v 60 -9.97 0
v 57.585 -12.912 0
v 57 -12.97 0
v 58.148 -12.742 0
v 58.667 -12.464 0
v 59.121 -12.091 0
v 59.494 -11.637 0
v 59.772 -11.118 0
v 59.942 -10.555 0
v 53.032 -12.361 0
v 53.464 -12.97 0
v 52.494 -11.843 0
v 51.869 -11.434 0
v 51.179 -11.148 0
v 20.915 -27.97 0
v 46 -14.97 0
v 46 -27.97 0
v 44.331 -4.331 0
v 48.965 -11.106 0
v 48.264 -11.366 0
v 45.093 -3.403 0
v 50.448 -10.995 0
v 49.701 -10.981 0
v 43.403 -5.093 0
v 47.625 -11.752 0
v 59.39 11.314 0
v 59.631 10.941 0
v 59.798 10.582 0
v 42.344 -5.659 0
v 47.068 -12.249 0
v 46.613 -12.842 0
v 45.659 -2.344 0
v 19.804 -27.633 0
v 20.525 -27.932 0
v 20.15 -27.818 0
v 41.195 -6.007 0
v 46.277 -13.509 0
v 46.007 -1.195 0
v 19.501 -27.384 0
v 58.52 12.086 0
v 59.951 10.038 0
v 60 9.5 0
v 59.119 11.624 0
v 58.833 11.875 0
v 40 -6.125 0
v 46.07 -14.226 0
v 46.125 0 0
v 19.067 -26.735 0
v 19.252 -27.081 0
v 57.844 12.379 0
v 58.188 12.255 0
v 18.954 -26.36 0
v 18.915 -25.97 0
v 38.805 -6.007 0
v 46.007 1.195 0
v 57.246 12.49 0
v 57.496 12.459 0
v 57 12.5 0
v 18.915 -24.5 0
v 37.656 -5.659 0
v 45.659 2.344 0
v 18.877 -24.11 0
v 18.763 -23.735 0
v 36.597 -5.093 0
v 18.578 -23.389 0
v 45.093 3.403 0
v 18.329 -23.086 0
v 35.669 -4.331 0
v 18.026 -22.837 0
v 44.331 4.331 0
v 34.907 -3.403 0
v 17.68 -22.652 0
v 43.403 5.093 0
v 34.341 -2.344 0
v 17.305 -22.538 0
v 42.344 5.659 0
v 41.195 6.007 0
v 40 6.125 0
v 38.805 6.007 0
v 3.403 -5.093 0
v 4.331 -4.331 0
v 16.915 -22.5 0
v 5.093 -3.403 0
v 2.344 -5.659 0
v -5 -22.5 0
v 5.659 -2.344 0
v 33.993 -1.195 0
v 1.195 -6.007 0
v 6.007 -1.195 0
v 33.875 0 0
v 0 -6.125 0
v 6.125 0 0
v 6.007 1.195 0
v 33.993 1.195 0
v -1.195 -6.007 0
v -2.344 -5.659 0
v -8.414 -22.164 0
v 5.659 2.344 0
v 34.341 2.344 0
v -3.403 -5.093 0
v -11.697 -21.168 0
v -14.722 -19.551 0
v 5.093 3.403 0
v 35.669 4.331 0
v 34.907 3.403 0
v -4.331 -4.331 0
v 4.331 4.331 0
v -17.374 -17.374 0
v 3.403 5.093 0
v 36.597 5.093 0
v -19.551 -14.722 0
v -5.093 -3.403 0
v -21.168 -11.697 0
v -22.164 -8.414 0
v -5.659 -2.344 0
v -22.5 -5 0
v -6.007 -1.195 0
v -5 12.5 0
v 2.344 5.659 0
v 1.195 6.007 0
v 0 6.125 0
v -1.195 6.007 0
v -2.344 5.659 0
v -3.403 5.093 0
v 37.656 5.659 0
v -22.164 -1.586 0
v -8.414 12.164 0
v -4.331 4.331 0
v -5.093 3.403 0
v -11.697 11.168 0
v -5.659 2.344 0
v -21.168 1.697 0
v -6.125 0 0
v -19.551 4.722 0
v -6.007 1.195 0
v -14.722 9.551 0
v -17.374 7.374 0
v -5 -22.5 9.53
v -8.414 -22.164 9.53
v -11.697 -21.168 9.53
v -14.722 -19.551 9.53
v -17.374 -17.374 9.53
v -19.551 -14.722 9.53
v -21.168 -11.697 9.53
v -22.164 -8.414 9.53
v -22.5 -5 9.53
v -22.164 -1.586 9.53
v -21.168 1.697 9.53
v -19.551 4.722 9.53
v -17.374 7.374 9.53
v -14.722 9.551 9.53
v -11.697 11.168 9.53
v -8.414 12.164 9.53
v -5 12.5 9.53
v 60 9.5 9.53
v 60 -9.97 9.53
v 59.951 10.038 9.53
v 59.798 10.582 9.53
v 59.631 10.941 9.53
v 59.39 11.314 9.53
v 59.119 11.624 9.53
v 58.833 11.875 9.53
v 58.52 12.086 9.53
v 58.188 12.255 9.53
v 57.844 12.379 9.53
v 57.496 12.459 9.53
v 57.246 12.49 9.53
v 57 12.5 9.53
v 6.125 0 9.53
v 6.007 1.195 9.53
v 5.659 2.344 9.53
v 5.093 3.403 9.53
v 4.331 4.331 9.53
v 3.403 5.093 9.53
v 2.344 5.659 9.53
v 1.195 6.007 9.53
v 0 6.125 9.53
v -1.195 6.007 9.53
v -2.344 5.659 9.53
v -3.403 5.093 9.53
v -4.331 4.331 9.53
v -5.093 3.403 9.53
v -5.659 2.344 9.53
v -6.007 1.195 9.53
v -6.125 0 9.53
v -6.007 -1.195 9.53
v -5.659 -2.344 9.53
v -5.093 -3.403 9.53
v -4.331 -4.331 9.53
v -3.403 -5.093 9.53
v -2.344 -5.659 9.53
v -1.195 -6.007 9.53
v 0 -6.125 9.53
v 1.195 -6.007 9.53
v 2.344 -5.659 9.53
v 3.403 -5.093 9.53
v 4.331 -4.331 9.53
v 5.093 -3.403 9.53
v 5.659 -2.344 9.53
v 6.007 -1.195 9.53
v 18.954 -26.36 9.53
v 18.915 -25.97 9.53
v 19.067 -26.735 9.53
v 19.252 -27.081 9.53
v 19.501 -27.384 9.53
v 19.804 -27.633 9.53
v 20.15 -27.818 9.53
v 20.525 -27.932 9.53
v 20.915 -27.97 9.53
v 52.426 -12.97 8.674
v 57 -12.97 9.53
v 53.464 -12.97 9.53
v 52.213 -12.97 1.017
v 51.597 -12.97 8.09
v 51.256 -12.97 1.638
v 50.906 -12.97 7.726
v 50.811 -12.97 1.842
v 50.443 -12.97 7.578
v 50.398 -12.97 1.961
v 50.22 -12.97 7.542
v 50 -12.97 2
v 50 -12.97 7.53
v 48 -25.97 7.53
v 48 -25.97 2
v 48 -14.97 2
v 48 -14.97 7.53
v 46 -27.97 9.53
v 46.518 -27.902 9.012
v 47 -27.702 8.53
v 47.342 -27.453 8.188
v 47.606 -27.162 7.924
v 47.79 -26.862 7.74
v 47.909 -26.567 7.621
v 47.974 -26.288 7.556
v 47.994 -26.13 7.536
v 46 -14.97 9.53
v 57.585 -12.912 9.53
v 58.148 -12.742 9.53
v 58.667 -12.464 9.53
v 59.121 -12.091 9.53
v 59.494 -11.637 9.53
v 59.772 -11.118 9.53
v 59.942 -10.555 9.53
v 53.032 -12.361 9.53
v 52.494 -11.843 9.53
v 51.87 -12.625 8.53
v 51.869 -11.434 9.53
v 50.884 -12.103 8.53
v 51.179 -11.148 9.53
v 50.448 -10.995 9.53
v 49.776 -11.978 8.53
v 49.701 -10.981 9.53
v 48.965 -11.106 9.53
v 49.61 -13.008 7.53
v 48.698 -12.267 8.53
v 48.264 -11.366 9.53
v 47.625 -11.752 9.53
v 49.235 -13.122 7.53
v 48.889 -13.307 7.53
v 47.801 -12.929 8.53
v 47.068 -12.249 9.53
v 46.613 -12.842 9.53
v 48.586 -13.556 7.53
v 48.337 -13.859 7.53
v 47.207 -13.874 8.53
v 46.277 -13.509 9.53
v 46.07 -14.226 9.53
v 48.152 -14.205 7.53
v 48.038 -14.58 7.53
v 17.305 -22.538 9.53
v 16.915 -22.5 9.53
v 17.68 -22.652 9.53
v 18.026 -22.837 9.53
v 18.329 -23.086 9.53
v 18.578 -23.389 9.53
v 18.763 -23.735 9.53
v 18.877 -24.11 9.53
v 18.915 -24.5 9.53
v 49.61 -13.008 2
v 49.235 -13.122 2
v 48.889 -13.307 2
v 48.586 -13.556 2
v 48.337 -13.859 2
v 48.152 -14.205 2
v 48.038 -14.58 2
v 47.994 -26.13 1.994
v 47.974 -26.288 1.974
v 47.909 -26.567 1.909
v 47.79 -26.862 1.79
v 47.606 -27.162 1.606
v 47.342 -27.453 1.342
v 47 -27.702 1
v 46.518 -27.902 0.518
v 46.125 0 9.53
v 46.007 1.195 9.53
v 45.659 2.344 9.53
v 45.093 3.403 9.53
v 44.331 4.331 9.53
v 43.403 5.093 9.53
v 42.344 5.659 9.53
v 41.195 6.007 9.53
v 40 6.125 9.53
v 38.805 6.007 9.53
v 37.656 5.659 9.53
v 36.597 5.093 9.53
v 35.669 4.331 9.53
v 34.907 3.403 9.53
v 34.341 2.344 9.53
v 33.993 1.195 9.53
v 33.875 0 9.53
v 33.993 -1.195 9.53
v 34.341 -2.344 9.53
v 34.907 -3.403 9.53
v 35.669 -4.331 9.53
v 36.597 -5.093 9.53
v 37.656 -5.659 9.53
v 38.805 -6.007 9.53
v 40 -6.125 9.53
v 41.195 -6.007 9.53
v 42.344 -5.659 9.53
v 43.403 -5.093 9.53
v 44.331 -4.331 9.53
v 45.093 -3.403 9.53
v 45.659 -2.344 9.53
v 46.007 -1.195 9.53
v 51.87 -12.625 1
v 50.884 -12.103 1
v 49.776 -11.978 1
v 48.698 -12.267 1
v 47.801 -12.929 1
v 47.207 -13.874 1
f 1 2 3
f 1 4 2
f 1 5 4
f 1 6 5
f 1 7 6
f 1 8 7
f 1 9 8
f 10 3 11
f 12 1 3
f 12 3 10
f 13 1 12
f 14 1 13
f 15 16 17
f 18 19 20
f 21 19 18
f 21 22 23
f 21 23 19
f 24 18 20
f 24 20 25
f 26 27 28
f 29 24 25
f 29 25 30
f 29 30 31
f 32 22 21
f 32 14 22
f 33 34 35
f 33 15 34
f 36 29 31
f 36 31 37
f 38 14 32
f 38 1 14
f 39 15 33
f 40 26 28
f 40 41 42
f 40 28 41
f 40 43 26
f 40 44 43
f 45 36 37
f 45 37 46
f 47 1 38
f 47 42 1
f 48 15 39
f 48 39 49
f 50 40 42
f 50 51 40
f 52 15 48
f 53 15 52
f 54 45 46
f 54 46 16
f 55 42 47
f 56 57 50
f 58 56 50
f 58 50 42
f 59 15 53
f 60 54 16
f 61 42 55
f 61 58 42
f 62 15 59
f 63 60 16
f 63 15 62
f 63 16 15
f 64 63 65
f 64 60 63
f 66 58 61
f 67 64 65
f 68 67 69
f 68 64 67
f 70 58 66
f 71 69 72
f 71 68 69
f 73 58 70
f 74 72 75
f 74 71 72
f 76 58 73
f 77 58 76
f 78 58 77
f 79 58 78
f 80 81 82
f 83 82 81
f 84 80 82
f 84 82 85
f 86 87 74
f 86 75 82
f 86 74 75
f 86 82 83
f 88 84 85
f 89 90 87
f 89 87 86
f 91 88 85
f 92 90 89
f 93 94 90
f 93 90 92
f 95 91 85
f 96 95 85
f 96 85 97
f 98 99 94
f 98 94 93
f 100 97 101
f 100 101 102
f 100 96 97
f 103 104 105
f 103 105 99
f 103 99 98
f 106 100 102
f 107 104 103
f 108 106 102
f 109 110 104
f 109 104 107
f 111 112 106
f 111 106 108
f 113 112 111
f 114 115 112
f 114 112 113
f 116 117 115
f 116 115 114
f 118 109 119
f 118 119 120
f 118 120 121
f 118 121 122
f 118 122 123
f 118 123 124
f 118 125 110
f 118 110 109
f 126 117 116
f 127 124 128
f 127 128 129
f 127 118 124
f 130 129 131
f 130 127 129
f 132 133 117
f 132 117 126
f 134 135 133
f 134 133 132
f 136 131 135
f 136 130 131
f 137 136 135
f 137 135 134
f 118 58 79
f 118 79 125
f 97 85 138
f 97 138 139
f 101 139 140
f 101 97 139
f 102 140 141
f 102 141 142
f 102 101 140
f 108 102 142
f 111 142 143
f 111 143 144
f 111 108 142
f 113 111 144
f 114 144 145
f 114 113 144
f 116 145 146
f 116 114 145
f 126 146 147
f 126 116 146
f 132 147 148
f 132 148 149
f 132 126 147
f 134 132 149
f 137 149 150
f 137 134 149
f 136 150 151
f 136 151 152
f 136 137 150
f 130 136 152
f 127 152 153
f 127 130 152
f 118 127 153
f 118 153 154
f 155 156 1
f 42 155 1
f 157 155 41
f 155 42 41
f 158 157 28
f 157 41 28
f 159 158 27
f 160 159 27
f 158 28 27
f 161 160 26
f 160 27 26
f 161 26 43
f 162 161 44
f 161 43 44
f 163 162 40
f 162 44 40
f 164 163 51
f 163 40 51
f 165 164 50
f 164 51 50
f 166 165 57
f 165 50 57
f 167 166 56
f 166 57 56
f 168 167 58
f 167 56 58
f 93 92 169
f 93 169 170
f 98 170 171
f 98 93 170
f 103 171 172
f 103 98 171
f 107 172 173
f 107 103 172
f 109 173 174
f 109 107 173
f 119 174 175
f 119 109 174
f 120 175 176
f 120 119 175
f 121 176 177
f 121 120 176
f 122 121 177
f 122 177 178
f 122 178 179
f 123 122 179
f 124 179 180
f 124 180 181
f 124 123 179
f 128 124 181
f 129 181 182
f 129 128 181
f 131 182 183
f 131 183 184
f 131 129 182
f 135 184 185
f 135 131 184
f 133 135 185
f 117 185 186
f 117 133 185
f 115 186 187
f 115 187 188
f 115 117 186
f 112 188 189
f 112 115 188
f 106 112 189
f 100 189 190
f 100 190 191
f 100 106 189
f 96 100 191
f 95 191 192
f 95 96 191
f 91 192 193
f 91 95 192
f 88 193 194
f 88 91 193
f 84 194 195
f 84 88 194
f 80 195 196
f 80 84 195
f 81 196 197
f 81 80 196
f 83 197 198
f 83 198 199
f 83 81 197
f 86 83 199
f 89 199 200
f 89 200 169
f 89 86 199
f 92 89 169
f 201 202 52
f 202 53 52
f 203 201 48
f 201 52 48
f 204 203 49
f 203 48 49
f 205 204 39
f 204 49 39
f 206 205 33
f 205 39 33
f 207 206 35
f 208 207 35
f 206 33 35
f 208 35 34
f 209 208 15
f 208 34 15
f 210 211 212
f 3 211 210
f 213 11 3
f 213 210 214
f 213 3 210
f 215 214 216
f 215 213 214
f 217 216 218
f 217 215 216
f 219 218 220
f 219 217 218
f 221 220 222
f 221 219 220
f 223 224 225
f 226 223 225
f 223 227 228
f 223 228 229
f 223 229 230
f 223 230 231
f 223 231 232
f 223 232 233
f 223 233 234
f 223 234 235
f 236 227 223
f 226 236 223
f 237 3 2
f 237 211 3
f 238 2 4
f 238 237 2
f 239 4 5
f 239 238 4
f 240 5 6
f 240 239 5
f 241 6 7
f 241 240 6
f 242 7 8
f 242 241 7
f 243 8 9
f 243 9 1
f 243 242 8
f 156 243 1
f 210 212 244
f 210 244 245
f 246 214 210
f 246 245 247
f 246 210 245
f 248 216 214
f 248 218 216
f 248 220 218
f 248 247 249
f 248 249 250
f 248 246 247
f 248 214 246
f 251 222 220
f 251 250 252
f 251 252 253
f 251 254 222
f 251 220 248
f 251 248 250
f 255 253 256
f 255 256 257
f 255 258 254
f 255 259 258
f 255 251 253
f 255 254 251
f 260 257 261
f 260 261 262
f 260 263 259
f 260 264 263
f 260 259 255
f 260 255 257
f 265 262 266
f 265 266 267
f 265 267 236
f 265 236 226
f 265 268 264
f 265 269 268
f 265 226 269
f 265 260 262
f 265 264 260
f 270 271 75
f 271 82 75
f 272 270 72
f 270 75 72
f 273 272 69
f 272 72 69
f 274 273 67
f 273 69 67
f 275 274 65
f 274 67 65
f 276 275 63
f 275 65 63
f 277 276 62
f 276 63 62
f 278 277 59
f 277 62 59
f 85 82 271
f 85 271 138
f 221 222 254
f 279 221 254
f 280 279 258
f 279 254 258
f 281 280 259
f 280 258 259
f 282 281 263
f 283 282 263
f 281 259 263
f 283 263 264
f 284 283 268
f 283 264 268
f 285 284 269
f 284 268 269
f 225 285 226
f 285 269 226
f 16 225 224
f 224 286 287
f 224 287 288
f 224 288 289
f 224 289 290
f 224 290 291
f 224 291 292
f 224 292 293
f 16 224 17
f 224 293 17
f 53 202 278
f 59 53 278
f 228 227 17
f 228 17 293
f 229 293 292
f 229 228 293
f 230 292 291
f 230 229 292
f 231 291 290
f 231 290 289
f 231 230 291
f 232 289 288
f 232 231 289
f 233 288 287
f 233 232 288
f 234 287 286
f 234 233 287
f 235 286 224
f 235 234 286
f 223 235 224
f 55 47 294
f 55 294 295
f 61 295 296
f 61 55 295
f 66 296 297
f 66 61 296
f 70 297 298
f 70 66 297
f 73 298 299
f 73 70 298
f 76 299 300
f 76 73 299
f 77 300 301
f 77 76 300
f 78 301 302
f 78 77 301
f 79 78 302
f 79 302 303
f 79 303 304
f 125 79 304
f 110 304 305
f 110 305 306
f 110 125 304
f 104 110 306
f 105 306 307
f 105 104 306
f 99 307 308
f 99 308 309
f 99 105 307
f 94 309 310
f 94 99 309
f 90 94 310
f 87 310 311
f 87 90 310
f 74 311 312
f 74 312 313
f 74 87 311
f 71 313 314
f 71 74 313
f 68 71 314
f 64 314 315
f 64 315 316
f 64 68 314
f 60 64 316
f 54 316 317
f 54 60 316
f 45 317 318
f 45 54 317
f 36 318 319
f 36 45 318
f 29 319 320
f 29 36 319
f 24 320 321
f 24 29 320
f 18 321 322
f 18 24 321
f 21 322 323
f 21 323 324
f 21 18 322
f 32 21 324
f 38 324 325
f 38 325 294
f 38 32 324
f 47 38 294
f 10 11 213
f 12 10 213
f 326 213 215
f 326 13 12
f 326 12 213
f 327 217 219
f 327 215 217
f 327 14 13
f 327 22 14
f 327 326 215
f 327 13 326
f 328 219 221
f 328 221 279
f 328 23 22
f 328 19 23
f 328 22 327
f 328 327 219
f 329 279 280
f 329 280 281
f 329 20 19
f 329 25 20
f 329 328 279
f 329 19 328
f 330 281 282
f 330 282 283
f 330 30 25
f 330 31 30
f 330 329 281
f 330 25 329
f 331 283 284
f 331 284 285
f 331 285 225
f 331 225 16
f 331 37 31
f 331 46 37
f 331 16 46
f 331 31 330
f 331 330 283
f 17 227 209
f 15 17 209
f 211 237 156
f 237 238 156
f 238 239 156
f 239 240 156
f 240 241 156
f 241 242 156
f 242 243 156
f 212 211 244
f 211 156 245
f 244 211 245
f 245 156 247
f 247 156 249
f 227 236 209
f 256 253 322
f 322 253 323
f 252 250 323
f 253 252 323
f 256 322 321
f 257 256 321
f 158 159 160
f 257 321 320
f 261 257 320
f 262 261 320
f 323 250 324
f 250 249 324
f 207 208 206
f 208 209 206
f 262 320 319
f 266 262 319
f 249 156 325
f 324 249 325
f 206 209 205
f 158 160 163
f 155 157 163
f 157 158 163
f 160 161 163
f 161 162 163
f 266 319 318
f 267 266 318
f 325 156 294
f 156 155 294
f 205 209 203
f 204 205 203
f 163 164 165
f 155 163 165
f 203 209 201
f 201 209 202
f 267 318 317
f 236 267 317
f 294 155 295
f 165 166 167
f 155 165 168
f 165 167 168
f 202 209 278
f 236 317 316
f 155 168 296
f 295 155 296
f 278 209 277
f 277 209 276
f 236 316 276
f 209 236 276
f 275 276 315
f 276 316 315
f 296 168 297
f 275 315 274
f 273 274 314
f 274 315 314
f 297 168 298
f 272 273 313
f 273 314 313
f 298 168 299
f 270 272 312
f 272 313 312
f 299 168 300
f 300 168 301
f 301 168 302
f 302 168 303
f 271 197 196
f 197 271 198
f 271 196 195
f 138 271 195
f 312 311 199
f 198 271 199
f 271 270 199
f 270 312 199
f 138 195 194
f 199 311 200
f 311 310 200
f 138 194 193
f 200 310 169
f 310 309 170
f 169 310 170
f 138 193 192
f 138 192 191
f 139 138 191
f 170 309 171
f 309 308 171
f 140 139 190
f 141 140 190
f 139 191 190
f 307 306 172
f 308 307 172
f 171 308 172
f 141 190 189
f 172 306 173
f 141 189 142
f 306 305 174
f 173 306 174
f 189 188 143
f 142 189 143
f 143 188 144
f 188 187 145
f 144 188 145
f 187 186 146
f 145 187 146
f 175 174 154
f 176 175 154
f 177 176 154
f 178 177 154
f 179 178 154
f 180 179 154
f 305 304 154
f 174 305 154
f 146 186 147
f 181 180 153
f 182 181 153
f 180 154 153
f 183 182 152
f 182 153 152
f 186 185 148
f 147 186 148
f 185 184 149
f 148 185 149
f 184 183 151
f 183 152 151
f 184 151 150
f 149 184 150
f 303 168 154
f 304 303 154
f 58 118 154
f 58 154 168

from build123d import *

# Parameters (mm, degrees)
CROQUIS1_R                       = 6.125
SALIENTE_EXTRUIR1_DEPTH          = 9.53
BRIDA_DE_ARISTA1_STRIP_W         = 57.18
BRIDA_DE_ARISTA1_STRIP_H         = 9.53
BRIDA_DE_ARISTA1_STRIP_CUT_DEPTH = 85
BRIDA_DE_ARISTA1_DEPTH           = 85
REDONDEO1_R                      = 10
CHAFL_N1_SIZE                    = 25
CHAFL_N1_SIZE2                   = 20
REDONDEO2_R                      = 20
CORTAR_EXTRUIR3_DEPTH            = 148.009594705
CORTAR_EXTRUIR3_DEPTH_BACK       = 148.009594705
CROQUIS7_W                       = 70
CROQUIS7_H                       = 50
CORTAR_EXTRUIR5_DEPTH            = 92.169188443
CORTAR_EXTRUIR5_DEPTH_BACK       = 92.169188443
CROQUIS8_W                       = 21.963248134
CROQUIS8_H                       = 19.06
CORTAR_EXTRUIR6_REACH            = 68.882
CROQUIS10_W                      = 12
CROQUIS10_H                      = 15
SALIENTE_EXTRUIR3_START          = -9.53
SALIENTE_EXTRUIR3_DEPTH          = 9.53
REDONDEO3_R                      = 3
REDONDEO4_R                      = 2
CHAFL_N2_SIZE                    = 2


# Sheet-metal steps are written as plain solids
with BuildPart() as part:
    # Croquis1 → Saliente-Extruir1 (new body)
    with BuildSketch(Plane.XY):
        with BuildLine():
            Line((-5, 12.5), (59.758688568, 12.5))
            ThreePointArc((59.758688568, 12.5), (63.068757982, 11.936283192), (66.005639043, 10.308688094))
            Line((66.005639043, 10.308688094), (70.527359279, 6.691311906))
            ThreePointArc((70.527359279, 6.691311906), (73.464240341, 5.063716808), (76.774309755, 4.5))
            Line((76.774309755, 4.5), (123.266499161, 4.5))
            ThreePointArc((123.266499161, 4.5), (125.848488059, 3.781744193), (127.688665549, 1.833333333))
            ThreePointArc((127.688665549, 1.833333333), (129.41356885, -2.692366017), (130, -7.5))
            Line((130, -7.5), (130, -37.5))
            Line((130, -37.5), (45, -37.5))
            Line((45, -37.5), (45, -22.5))
            Line((45, -22.5), (-5, -22.5))
            ThreePointArc((-5, -22.5), (-22.5, -5), (-5, 12.5))
        make_face()
        Circle(CROQUIS1_R, mode=Mode.SUBTRACT)
        with Locations((40, 0)):
            Circle(CROQUIS1_R, mode=Mode.SUBTRACT)
    extrude(amount=SALIENTE_EXTRUIR1_DEPTH)

    # Brida de arista1 strip (across the edge) → Brida de arista1 strip cut (cut)
    with BuildSketch(Plane(origin=(45, -37.5, 9.53), x_dir=(0, 1, 0), z_dir=(1, 0, 0))):
        with Locations((-19.06, -4.765)):
            Rectangle(BRIDA_DE_ARISTA1_STRIP_W, BRIDA_DE_ARISTA1_STRIP_H)
    extrude(amount=BRIDA_DE_ARISTA1_STRIP_CUT_DEPTH, mode=Mode.SUBTRACT)

    # Brida de arista1 section (across the edge) → Brida de arista1 (add)
    with BuildSketch(Plane(origin=(45, -37.5, 9.53), x_dir=(0, 1, 0), z_dir=(1, 0, 0))):
        with BuildLine():
            Line((-9.53, 9.53), (-9.53, 40.47))
            Line((-9.53, 40.47), (0, 40.47))
            Line((0, 40.47), (0, 9.53))
            ThreePointArc((0, 9.53), (2.791272375, 2.791272375), (9.53, 0))
            Line((9.53, 0), (9.53, -9.53))
            ThreePointArc((9.53, -9.53), (-3.947455249, -3.947455249), (-9.53, 9.53))
        make_face()
    extrude(amount=BRIDA_DE_ARISTA1_DEPTH)

    # Redondeo1
    redondeo1_edges = [part.edges().sort_by_distance(p)[0] for p in [
        (45, -22.5, 4.765),
        (45, -42.265, 50),
    ]]
    fillet(redondeo1_edges, radius=REDONDEO1_R)

    # Chaflán1
    chafl_n1_edges = [part.edges().sort_by_distance(p)[0] for p in [
        (130, -42.265, 50),
    ]]
    chafl_n1_side = [part.faces().sort_by_distance(p)[0] for p in [
        (130, -17.735, 0.637386923),
    ]]
    chamfer(chafl_n1_edges, length=CHAFL_N1_SIZE, length2=CHAFL_N1_SIZE2, reference=chafl_n1_side[0])

    # Redondeo2
    redondeo2_edges = [part.edges().sort_by_distance(p)[0] for p in [
        (110, -42.265, 50),
        (130, -42.265, 25),
    ]]
    fillet(redondeo2_edges, radius=REDONDEO2_R)

    # Croquis7 → Cortar-Extruir3 (cut, two sides: drawn at the far end of the back side and taken through both)
    with BuildSketch(Plane(origin=(0, 0, 0), x_dir=(1, 0, 0), z_dir=(0, 1, 0)).offset(-CORTAR_EXTRUIR3_DEPTH_BACK)):
        with Locations((95, -25)):
            Rectangle(CROQUIS7_W, CROQUIS7_H)
    extrude(amount=CORTAR_EXTRUIR3_DEPTH + CORTAR_EXTRUIR3_DEPTH_BACK, mode=Mode.SUBTRACT)

    # Croquis8 → Cortar-Extruir5 (cut, two sides: drawn at the far end of the back side and taken through both)
    with BuildSketch(Plane.XY.offset(-CORTAR_EXTRUIR5_DEPTH_BACK)):
        with Locations((49.018375933, -37.5)):
            Rectangle(CROQUIS8_W, CROQUIS8_H)
    extrude(amount=CORTAR_EXTRUIR5_DEPTH + CORTAR_EXTRUIR5_DEPTH_BACK, mode=Mode.SUBTRACT)

    # Croquis10 → Cortar-Extruir6 (cut, up to next)
    with BuildSketch(Plane(origin=(0, 0, 0), x_dir=(-1, 0, 0), z_dir=(0, 0, -1)), mode=Mode.PRIVATE) as cortar_extruir6_sk1:
        with Locations((-54, -20.47)):
            Rectangle(CROQUIS10_W, CROQUIS10_H)
    cortar_extruir6_tool1 = extrude(cortar_extruir6_sk1.sketch, amount=-CORTAR_EXTRUIR6_REACH, mode=Mode.PRIVATE) & part.part
    add(cortar_extruir6_tool1.solids().sort_by_distance((54, -20.47, 0))[0], mode=Mode.SUBTRACT)

    # Croquis9 → Saliente-Extruir3 (add)
    with BuildSketch(Plane(origin=(0, 0, 0), x_dir=(-1, 0, 0), z_dir=(0, 0, -1)).offset(SALIENTE_EXTRUIR3_START)):
        with BuildLine():
            Line((-18.915105159, -22.5), (-35, -22.5))
            ThreePointArc((-35, -22.5), (-40.229722746, -23.976503065), (-43.915105159, -27.97))
            Line((-43.915105159, -27.97), (-18.915105159, -27.97))
            Line((-18.915105159, -27.97), (-18.915105159, -22.5))
        make_face()
    extrude(amount=SALIENTE_EXTRUIR3_DEPTH)

    # Redondeo3
    redondeo3_edges = [part.edges().sort_by_distance(p)[0] for p in [
        (60, -12.97, 4.765),
        (60, 12.497088016, 4.765),
    ]]
    fillet(redondeo3_edges, radius=REDONDEO3_R)

    # Redondeo4
    redondeo4_edges = [part.edges().sort_by_distance(p)[0] for p in [
        (48, -12.97, 4.765),
        (48, -27.97, 4.765),
        (18.915105159, -27.97, 4.765),
        (18.915105159, -22.5, 4.765),
    ]]
    fillet(redondeo4_edges, radius=REDONDEO4_R)

    # Chaflán2
    # the kernel refuses this chamfer: 2 mm, written as the material it takes off along each edge
    with BuildSketch(Plane(origin=(48, -31.113365976, 0), x_dir=(0.02749587661058563, 0, 0.9996219169112968), z_dir=(0, 1, 0))) as chafl_n2_piece_1:
        Polygon((CHAFL_N2_SIZE * 0.999621916911, -CHAFL_N2_SIZE * 0.0274958766106), (-CHAFL_N2_SIZE * 0.0274958766106, -CHAFL_N2_SIZE * 0.999621916911), (0, 0), align=None)
    extrude(amount=16.143365976, mode=Mode.SUBTRACT)
    with BuildSketch(Plane(origin=(48, -14.97, 9.53), x_dir=(-0.9996219169112968, 0, 0.02749587661058651), z_dir=(0, -1, 0))) as chafl_n2_piece_2:
        Polygon((CHAFL_N2_SIZE * 0.999621916911, CHAFL_N2_SIZE * 0.0274958766106), (-CHAFL_N2_SIZE * 0.0274958766106, CHAFL_N2_SIZE * 0.999621916911), (0, 0), align=None)
    extrude(amount=16.143365976, mode=Mode.SUBTRACT)
    with BuildSketch(Plane(origin=(50, -14.97, 0), x_dir=(0.5386859165215014, -0.8425066666450718, 0), z_dir=(-0.8425066666450718, -0.5386859165215014, 0))) as chafl_n2_piece_3:
        Polygon((2, CHAFL_N2_SIZE), (2 + CHAFL_N2_SIZE, 0), (2, 0), align=None)
    revolve(axis=Axis((50, -14.97, 0), (0, 0, 1)), revolution_arc=237.405771779, mode=Mode.SUBTRACT)
    with BuildSketch(Plane(origin=(50, -14.97, 9.53), x_dir=(0.5386859165215014, -0.8425066666450718, 0), z_dir=(-0.8425066666450718, -0.5386859165215014, 0))) as chafl_n2_piece_4:
        Polygon((2 + CHAFL_N2_SIZE, 0), (2, -CHAFL_N2_SIZE), (2, 0), align=None)
    revolve(axis=Axis((50, -14.97, 9.53), (0, 0, 1)), revolution_arc=237.405771779, mode=Mode.SUBTRACT)


solid = part.part
